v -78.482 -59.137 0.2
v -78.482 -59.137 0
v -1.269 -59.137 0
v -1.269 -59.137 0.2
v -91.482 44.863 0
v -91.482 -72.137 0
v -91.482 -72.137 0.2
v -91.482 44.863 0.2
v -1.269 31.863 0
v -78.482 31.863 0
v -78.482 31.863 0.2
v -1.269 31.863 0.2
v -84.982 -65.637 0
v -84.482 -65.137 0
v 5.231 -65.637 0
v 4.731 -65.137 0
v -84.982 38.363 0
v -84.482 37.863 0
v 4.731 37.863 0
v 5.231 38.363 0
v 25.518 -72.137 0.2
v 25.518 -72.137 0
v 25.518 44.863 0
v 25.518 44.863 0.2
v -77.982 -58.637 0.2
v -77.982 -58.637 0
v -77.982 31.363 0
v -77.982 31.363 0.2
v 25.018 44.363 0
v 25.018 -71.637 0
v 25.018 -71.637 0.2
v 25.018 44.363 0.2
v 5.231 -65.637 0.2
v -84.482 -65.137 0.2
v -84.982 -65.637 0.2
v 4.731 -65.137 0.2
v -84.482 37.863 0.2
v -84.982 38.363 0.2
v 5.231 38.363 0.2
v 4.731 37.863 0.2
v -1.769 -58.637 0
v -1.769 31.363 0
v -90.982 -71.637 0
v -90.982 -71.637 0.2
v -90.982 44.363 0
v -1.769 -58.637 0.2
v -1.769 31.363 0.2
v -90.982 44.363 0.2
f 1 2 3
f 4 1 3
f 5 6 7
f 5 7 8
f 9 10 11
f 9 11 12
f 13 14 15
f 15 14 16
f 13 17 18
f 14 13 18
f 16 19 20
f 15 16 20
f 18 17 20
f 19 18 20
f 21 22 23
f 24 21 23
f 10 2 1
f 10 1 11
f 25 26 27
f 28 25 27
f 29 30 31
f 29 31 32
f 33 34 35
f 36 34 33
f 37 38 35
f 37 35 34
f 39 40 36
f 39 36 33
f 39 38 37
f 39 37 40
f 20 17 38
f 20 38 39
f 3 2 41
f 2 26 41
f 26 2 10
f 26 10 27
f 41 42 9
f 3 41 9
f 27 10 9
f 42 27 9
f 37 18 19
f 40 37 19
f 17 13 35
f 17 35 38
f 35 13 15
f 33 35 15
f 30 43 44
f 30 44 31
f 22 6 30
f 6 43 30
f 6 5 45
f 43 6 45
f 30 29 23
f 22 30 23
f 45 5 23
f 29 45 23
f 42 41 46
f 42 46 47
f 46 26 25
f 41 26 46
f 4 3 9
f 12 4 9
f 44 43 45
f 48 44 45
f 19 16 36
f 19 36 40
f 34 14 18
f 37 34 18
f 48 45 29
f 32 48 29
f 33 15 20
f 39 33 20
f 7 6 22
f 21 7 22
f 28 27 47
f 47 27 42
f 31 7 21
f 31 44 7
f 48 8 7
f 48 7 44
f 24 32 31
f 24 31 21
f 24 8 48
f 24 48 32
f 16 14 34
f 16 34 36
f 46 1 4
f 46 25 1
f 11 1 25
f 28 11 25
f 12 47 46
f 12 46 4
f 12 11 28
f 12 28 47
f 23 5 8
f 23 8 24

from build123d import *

# Parameters (mm, degrees)
F1_W     = 117
F1_H     = 117
F1_W_2   = 116
F1_H_2   = 116
F2_DEPTH = 0.2
F1_W_3   = 90.2133469
F1_H_3   = 104
F1_W_4   = 89.2133469
F1_H_4   = 103
F1_W_5   = 77.2133469
F1_H_5   = 91
F1_W_6   = 76.2133469
F1_H_6   = 90


# Not quite as in the source:
# - a feature names something its author has since deleted; it is built from what else it names


with BuildPart() as f2:
    # F1 (on Top) → F2 (new body)
    with BuildSketch(Plane.XY):
        with Locations((-32.9824382961, -13.6367691362)):
            Rectangle(F1_W, F1_H)
        with Locations((-32.9824382961, -13.6367691362)):
            Rectangle(F1_W_2, F1_H_2, mode=Mode.SUBTRACT)
    extrude(amount=F2_DEPTH)


with BuildPart() as f2b:
    # F1 (on Top) → F2, piece 2 (new body)
    with BuildSketch(Plane.XY):
        with Locations((-39.8757648461, -13.6367691362)):
            Rectangle(F1_W_3, F1_H_3)
        with Locations((-39.8757648461, -13.6367691362)):
            Rectangle(F1_W_4, F1_H_4, mode=Mode.SUBTRACT)
    extrude(amount=F2_DEPTH)


with BuildPart() as f2c:
    # F1 (on Top) → F2, piece 3 (new body)
    with BuildSketch(Plane.XY):
        with Locations((-39.8757648461, -13.6367691362)):
            Rectangle(F1_W_5, F1_H_5)
        with Locations((-39.8757648461, -13.6367691362)):
            Rectangle(F1_W_6, F1_H_6, mode=Mode.SUBTRACT)
    extrude(amount=F2_DEPTH)


solid = Compound([f2.part, f2b.part, f2c.part])
